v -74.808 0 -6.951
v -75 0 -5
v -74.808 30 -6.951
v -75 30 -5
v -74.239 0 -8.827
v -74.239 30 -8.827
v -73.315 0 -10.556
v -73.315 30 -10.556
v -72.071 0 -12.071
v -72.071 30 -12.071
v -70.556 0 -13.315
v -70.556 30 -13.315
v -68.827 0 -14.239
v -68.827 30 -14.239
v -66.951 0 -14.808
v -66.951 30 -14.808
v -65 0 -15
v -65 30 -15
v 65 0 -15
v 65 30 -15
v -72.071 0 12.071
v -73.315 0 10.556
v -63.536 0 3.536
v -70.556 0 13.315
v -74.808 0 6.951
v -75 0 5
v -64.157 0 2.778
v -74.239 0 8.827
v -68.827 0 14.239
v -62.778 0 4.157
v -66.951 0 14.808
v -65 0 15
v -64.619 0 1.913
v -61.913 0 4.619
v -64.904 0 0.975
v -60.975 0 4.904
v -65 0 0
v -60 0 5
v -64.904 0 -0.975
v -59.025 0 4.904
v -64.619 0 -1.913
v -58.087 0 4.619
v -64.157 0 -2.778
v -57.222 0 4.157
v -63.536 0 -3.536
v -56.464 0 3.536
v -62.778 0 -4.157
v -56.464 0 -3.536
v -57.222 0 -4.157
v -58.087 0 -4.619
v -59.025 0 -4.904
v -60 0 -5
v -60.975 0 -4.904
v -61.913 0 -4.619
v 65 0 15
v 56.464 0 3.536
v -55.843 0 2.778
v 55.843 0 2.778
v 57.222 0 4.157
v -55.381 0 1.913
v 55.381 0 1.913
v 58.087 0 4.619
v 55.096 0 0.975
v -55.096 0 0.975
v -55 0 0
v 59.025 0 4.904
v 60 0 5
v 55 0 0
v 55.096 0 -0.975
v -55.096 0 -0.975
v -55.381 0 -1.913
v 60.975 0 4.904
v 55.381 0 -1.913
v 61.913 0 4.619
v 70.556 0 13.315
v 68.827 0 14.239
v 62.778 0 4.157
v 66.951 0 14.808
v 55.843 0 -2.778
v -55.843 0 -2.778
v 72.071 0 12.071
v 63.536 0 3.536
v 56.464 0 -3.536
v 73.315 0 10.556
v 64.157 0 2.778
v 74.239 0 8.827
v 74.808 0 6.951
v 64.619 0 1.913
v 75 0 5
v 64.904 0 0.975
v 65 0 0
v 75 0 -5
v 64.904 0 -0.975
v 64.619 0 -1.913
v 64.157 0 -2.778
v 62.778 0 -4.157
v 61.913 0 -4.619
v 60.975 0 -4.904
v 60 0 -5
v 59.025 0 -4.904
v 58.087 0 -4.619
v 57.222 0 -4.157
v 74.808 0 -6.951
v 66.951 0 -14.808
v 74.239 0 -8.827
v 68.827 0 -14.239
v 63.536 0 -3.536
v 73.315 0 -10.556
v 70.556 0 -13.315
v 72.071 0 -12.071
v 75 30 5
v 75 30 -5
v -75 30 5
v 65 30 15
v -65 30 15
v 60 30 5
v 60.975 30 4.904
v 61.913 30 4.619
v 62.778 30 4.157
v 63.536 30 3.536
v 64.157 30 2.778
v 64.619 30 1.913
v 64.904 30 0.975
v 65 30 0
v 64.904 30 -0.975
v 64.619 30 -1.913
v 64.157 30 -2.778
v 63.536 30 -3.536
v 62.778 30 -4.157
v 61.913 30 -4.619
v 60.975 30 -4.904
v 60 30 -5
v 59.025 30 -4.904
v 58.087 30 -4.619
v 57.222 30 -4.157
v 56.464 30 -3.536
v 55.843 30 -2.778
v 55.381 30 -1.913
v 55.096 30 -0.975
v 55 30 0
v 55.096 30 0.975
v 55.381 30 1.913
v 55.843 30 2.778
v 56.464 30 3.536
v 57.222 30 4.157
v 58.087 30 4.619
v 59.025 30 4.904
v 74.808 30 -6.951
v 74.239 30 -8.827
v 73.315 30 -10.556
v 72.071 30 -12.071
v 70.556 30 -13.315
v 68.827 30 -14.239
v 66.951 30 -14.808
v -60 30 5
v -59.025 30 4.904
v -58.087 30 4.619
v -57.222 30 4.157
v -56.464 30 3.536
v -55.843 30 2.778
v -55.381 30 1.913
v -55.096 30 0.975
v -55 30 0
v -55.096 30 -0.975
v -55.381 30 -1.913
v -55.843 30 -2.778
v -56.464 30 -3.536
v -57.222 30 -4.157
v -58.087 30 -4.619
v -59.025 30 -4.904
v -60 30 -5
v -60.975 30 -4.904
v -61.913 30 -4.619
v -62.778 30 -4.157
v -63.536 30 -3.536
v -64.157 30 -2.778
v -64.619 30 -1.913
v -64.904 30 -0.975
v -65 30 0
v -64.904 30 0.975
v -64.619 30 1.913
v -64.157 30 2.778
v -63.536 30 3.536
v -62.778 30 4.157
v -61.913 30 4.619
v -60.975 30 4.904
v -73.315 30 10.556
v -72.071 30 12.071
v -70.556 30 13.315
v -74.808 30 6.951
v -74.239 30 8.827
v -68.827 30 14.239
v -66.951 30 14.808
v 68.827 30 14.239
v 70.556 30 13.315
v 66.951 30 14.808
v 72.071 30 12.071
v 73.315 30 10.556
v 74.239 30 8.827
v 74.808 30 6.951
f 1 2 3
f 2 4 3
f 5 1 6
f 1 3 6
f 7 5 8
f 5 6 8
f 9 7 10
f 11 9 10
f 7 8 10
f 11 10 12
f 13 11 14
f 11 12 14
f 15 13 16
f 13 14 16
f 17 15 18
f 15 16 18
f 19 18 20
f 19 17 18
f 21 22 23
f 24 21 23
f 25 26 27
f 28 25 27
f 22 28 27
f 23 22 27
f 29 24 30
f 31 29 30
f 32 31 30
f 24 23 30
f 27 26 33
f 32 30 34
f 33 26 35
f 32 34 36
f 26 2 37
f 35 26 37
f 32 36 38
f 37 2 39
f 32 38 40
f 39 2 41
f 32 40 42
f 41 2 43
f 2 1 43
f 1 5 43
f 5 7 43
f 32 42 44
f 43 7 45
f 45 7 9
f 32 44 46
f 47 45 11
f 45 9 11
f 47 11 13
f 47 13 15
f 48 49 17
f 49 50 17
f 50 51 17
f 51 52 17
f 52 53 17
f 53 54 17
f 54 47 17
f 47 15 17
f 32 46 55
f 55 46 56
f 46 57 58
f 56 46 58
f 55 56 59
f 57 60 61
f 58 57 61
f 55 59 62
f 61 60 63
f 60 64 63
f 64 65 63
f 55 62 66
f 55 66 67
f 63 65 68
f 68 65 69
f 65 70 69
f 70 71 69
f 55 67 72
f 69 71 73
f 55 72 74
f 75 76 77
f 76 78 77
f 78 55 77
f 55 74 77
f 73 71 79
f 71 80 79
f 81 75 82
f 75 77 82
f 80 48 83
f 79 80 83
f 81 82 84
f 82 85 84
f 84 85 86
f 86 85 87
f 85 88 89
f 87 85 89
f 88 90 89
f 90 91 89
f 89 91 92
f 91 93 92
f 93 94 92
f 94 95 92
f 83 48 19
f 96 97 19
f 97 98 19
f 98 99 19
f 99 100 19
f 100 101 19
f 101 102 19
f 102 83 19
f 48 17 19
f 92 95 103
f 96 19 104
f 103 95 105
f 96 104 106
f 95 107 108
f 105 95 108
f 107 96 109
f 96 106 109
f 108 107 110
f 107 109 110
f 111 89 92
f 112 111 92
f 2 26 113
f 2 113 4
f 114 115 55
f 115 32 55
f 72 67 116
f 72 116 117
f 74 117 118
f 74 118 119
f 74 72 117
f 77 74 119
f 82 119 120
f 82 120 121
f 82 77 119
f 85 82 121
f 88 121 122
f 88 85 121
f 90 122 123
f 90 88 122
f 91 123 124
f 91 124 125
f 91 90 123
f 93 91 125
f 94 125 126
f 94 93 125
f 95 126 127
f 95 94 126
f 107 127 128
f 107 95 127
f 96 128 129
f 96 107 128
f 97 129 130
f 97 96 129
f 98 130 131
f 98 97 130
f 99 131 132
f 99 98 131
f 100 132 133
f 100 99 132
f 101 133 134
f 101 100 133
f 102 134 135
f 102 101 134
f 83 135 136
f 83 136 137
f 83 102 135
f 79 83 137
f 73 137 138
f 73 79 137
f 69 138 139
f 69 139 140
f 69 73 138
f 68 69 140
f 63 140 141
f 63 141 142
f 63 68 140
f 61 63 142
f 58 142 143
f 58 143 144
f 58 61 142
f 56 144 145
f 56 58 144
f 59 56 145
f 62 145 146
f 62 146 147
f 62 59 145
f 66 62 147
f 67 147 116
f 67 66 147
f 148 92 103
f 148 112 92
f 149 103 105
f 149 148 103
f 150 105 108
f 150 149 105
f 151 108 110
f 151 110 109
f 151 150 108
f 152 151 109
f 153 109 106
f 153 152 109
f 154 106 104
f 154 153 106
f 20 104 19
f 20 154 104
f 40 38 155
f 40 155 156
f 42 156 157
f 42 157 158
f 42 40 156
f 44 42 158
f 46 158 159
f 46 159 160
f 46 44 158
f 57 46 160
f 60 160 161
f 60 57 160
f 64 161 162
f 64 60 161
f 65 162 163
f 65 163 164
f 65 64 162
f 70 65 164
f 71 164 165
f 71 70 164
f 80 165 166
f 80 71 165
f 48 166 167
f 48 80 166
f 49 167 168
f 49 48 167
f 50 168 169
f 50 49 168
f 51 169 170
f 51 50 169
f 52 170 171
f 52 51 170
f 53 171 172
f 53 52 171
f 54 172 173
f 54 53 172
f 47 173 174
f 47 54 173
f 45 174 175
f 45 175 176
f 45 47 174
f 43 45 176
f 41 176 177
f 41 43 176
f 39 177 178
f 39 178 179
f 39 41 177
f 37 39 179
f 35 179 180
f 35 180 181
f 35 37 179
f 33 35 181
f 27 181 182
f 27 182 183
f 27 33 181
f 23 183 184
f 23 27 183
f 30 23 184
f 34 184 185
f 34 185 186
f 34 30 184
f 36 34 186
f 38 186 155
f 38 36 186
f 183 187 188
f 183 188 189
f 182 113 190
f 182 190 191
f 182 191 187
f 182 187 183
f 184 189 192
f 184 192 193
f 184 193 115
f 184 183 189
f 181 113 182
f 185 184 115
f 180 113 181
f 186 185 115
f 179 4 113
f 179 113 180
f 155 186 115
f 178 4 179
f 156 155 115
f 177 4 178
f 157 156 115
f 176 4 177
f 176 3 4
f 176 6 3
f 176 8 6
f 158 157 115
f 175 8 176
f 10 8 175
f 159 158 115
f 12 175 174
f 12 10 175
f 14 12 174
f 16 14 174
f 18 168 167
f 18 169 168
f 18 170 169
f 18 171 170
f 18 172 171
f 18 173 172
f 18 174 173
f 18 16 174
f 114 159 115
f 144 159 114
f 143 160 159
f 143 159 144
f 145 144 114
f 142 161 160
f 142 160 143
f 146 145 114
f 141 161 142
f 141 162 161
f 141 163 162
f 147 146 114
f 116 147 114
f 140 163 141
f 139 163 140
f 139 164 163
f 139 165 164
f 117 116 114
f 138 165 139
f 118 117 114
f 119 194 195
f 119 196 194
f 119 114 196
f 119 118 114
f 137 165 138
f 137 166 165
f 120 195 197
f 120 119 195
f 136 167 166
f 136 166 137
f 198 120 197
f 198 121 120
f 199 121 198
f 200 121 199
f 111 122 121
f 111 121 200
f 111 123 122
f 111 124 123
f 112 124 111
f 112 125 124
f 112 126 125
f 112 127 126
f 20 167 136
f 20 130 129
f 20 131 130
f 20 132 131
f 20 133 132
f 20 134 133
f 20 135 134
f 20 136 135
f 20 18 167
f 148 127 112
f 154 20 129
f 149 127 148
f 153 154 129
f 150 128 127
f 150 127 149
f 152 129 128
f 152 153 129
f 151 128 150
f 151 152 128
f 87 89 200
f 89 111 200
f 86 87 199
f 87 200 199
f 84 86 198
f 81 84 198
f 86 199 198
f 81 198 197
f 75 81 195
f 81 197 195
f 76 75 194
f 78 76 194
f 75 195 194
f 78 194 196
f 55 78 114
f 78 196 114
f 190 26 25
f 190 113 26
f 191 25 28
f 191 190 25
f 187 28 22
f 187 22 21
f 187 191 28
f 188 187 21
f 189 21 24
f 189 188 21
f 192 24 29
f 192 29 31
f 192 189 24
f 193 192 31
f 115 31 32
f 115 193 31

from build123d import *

# Parameters (mm, degrees)
SKETCH1_W           = 90
SKETCH1_H           = 30
SKETCH1_W_2         = 30
SKETCH1_R           = 5
BOSS_EXTRUDE1_DEPTH = 30
FILLET1_R           = 10


with BuildPart() as part:
    # Sketch1 → Boss-Extrude1 (new body)
    # profile 1 of 3: a face of its own
    with BuildSketch(Plane(origin=(0, 0, 0), x_dir=(1, 0, 0), z_dir=(0, 1, 0))):
        Rectangle(SKETCH1_W, SKETCH1_H)
    # profile 2 of 3: a face of its own
    with BuildSketch(Plane(origin=(0, 0, 0), x_dir=(1, 0, 0), z_dir=(0, 1, 0))):
        with Locations((60, 0)):
            Rectangle(SKETCH1_W_2, SKETCH1_H)
        with Locations(Location((60, 0, 0), (0, 0, 270))):
            Circle(SKETCH1_R, mode=Mode.SUBTRACT)
    # profile 3 of 3: a face of its own
    with BuildSketch(Plane(origin=(0, 0, 0), x_dir=(1, 0, 0), z_dir=(0, 1, 0))):
        with Locations((-60, 0)):
            Rectangle(SKETCH1_W_2, SKETCH1_H)
        with Locations(Location((-60, 0, 0), (0, 0, 270))):
            Circle(SKETCH1_R, mode=Mode.SUBTRACT)
    extrude(amount=BOSS_EXTRUDE1_DEPTH)

    # Fillet1
    fillet1_edges = [part.edges().sort_by_distance(p)[0] for p in [
        (-75, 15, 15),
        (-75, 15, -15),
        (75, 15, -15),
        (75, 15, 15),
    ]]
    fillet(fillet1_edges, radius=FILLET1_R)


solid = part.part
